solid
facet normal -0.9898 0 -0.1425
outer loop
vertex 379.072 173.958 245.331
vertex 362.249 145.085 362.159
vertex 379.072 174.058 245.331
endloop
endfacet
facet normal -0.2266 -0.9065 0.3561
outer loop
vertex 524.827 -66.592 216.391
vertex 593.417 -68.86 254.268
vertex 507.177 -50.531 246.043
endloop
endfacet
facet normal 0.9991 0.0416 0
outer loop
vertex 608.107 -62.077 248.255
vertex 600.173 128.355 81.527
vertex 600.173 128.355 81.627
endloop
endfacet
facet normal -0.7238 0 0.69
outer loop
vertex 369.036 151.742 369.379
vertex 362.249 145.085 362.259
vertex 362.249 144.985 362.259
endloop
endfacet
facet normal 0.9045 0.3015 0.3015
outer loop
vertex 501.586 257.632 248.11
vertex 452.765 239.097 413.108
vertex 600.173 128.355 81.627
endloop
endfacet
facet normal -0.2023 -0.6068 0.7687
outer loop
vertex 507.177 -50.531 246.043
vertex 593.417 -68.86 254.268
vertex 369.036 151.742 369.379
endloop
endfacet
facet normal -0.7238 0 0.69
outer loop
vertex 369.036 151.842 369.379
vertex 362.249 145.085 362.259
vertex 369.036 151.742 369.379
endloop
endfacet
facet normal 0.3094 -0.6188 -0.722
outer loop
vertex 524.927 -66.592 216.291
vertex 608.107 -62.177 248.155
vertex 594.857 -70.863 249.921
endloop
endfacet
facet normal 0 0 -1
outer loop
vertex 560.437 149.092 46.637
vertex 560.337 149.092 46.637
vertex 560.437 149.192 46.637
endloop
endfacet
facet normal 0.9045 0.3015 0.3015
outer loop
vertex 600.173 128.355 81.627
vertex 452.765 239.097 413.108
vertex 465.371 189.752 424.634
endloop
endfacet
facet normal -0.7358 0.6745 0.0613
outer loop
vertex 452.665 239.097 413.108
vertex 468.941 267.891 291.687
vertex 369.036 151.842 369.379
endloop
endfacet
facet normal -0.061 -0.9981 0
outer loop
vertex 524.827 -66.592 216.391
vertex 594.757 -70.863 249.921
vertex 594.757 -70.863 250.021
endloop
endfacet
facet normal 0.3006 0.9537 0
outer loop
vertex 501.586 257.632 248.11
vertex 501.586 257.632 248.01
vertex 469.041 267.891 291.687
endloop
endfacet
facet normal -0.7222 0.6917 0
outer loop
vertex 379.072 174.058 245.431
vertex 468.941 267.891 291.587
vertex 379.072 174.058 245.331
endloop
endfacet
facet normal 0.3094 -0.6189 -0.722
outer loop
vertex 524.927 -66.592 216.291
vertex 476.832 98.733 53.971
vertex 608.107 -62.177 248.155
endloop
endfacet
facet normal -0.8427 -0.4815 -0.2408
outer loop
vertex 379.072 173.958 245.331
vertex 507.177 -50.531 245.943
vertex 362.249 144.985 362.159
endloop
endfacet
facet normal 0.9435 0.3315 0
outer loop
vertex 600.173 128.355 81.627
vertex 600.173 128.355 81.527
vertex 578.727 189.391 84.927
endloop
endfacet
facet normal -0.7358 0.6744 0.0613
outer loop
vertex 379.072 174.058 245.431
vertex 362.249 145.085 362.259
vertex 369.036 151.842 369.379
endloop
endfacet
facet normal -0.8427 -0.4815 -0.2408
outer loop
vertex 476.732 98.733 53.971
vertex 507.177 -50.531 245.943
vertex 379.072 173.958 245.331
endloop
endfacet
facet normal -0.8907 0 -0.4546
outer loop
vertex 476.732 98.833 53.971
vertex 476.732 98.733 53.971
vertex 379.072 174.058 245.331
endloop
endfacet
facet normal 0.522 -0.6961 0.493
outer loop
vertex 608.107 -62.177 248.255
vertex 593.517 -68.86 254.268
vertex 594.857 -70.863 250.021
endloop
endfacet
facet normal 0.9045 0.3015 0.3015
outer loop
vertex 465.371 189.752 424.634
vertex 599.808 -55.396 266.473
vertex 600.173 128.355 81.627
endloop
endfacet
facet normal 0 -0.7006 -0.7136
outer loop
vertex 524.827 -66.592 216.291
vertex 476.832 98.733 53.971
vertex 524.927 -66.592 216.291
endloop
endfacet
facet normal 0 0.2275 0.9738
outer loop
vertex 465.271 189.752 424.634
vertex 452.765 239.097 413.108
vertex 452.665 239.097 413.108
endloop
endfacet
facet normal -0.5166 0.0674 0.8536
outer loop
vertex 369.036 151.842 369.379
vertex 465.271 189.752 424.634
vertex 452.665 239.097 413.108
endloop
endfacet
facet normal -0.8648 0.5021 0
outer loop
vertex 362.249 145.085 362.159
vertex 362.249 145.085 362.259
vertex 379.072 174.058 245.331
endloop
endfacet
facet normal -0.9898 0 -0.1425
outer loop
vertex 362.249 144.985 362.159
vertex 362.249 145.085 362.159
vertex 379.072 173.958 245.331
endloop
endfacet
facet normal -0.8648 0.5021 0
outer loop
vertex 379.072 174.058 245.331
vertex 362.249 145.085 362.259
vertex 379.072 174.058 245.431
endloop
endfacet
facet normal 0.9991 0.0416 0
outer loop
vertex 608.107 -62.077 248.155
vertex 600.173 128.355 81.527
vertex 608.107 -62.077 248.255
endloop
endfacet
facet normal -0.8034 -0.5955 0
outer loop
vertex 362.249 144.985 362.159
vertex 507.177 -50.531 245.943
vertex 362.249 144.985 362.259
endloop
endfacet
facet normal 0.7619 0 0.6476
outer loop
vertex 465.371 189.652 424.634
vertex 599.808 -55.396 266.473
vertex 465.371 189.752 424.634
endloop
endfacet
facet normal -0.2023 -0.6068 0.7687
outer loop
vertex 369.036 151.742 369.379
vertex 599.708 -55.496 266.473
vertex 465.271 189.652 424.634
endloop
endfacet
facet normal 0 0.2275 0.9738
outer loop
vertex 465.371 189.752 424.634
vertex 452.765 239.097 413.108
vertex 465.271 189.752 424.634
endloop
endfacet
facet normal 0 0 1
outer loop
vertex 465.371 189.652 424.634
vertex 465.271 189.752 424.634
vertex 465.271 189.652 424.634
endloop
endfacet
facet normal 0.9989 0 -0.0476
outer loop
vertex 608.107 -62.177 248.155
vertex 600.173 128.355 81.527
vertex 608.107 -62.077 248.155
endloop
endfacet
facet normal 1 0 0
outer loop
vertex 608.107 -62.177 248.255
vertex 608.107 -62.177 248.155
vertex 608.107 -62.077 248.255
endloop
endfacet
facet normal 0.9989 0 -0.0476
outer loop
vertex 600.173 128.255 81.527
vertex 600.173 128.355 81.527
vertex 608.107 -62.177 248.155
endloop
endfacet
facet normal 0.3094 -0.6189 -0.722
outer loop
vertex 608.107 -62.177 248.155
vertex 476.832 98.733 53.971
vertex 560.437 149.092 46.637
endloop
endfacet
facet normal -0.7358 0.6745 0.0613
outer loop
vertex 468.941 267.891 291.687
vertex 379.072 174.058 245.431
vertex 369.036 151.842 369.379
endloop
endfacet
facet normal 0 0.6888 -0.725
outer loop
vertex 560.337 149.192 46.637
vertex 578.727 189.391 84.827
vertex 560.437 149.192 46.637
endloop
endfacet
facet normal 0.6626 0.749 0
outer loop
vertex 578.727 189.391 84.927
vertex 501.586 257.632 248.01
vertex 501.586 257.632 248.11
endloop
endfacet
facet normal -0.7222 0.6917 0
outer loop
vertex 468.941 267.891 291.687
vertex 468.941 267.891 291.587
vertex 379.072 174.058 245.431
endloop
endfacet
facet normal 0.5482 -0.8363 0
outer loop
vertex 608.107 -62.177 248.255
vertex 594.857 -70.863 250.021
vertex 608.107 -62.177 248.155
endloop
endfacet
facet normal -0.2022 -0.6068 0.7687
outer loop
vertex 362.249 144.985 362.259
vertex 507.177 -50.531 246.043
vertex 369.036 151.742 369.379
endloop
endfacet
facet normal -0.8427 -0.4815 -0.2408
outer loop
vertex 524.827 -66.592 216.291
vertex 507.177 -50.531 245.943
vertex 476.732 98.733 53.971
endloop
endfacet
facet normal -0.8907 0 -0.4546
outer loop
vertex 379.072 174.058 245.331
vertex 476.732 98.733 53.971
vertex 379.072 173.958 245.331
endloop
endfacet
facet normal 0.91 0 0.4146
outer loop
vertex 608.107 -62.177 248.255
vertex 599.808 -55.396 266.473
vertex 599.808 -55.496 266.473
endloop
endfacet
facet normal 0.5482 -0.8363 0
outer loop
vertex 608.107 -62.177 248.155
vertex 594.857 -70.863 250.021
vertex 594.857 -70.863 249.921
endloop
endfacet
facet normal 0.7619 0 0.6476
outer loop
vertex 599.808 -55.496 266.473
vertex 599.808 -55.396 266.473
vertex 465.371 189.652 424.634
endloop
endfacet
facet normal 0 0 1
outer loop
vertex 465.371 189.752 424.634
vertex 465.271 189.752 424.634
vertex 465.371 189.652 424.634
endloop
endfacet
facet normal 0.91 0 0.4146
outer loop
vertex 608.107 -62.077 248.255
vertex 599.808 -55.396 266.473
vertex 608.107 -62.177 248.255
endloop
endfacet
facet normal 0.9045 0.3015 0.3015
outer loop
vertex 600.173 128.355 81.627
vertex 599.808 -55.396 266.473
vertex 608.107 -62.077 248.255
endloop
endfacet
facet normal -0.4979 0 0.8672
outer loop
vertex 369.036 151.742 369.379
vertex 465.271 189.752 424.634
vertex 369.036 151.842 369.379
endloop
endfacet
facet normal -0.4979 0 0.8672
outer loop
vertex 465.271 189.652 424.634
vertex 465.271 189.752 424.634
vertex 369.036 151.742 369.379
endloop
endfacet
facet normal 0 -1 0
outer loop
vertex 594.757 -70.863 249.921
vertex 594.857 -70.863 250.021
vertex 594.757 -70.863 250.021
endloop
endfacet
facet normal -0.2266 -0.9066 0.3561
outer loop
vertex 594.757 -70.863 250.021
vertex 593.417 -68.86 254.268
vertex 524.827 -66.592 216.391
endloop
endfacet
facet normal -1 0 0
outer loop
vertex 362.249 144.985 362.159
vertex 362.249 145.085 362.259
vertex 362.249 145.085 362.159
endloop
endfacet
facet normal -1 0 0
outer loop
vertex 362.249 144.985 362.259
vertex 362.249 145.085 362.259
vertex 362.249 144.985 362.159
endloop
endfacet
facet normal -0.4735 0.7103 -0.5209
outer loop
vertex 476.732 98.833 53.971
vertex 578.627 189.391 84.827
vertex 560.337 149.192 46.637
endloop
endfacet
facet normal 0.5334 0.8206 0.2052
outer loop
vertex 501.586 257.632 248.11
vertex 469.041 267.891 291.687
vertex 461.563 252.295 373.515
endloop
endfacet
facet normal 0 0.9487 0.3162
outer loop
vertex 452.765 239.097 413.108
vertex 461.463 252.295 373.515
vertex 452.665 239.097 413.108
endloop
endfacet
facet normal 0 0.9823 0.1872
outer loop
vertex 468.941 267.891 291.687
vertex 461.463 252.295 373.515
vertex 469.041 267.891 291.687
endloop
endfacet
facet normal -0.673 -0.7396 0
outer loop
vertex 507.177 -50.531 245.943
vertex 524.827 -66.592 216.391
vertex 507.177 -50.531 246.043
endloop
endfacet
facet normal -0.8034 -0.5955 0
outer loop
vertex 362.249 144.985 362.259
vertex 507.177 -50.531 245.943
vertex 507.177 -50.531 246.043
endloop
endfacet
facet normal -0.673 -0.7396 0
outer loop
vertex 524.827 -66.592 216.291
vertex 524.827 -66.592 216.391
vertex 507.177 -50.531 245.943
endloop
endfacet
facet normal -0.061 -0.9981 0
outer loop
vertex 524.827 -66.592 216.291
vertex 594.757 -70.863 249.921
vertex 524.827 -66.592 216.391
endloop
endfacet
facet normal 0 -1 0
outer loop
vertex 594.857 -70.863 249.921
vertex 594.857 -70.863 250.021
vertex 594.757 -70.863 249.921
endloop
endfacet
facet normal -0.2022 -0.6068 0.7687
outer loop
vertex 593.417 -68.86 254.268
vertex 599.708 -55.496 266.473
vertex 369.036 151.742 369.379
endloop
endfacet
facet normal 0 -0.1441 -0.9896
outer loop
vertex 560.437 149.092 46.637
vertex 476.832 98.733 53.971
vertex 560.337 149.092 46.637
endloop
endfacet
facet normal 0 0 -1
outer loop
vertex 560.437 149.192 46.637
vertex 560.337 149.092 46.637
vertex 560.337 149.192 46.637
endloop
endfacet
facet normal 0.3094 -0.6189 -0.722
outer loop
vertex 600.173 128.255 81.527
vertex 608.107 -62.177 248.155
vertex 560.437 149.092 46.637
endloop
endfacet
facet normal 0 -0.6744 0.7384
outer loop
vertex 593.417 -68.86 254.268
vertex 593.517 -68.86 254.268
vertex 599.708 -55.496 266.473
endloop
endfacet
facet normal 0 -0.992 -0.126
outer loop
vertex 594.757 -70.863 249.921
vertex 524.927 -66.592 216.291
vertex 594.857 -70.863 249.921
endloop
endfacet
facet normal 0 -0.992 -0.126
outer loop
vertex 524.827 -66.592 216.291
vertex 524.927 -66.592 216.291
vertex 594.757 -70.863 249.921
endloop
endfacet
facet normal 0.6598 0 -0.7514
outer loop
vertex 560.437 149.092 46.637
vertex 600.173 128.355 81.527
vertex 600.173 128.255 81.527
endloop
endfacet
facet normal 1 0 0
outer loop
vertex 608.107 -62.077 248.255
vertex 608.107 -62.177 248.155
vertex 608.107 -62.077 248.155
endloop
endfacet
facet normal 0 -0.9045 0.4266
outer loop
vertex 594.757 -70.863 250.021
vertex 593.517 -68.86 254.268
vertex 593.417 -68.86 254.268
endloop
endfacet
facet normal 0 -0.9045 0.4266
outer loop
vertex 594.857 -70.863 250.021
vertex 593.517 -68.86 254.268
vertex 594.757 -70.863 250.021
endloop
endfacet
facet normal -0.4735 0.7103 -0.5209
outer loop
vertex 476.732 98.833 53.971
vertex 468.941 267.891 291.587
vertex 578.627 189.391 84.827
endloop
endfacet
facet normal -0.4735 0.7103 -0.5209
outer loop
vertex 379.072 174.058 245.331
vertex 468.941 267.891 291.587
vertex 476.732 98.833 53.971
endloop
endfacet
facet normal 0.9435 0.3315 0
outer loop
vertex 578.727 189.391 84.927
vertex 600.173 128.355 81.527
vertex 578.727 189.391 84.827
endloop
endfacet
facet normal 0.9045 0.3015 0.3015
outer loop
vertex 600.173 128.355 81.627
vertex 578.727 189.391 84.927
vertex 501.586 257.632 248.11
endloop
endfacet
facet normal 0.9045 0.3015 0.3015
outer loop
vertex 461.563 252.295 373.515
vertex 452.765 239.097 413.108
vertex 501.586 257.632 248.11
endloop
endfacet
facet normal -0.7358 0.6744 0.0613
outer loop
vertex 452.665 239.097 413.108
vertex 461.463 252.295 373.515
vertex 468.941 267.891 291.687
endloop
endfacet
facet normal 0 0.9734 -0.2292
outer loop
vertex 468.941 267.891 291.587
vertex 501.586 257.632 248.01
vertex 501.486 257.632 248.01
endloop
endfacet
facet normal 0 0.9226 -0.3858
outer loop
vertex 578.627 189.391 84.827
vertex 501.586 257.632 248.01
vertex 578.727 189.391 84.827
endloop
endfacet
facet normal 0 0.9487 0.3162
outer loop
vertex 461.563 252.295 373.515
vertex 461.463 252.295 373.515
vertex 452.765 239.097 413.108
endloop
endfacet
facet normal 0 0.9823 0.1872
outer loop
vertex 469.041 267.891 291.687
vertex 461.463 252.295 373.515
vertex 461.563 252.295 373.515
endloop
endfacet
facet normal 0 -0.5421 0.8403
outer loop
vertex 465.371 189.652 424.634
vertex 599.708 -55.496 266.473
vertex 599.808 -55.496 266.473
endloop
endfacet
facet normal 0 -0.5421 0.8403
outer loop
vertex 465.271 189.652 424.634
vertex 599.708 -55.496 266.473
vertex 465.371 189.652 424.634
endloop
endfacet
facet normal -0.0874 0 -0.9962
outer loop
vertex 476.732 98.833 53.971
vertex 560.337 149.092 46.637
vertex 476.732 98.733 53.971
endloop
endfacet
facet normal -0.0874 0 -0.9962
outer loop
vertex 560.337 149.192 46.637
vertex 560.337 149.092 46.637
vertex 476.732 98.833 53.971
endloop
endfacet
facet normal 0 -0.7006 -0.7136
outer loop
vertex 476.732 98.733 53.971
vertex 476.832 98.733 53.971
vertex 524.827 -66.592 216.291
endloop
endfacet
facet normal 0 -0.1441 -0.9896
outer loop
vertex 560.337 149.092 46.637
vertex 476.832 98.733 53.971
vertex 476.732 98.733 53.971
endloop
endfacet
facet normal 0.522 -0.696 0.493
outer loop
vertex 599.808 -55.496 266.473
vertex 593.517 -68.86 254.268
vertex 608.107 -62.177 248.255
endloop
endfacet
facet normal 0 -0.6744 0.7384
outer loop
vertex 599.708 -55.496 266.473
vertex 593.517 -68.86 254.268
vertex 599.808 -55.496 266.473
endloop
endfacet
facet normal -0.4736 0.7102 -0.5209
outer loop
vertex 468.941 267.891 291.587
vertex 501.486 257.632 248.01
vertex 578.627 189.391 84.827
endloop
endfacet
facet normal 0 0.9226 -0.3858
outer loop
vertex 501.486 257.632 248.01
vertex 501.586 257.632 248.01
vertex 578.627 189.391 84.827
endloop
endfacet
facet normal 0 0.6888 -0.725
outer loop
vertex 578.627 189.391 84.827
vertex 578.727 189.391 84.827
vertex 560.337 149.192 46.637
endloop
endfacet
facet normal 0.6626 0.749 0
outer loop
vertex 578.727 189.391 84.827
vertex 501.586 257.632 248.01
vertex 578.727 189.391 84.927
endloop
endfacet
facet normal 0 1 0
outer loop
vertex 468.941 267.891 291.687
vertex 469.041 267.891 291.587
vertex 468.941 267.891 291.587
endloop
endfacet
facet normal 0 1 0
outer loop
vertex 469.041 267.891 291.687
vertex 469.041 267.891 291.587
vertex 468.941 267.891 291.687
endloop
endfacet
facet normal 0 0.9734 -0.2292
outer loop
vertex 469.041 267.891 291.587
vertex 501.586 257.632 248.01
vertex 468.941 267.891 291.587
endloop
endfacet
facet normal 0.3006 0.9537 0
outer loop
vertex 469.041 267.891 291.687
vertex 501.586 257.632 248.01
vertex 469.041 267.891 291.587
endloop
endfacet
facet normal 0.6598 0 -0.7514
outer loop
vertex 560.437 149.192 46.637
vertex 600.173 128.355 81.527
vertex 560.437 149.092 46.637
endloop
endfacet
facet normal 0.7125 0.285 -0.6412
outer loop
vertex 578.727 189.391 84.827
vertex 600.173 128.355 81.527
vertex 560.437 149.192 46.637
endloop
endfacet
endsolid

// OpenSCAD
hull(){ translate([379.072289157,173.957831325,245.331325301])cube(0.1,0.1,0.1);
translate([362.249146758,144.984641638,362.158703072])cube(0.1,0.1,0.1);
translate([476.73210893,98.7333755541,53.9708676377])cube(0.1,0.1,0.1);
translate([524.826904055,-66.5924826904,216.290801187])cube(0.1,0.1,0.1);
translate([507.17662226,-50.530726257,245.943274602])cube(0.1,0.1,0.1);
translate([594.756973212,-70.8630212648,249.921292461])cube(0.1,0.1,0.1);
translate([593.417282046,-68.8598038135,254.167860686])cube(0.1,0.1,0.1);
translate([599.707746479,-55.4964788732,266.373239437])cube(0.1,0.1,0.1);
translate([608.007360673,-62.1766561514,248.154574132])cube(0.1,0.1,0.1);
translate([560.336730173,149.091714665,46.6371289322])cube(0.1,0.1,0.1);
translate([600.072727273,128.254545455,81.5272727273])cube(0.1,0.1,0.1);
translate([578.62745098,189.291101056,84.826546003])cube(0.1,0.1,0.1);
translate([369.036429053,151.741623566,369.279289409])cube(0.1,0.1,0.1);
translate([452.664907652,238.997361478,413.007915567])cube(0.1,0.1,0.1);
translate([465.271302251,189.65233119,424.533762058])cube(0.1,0.1,0.1);
translate([468.941105284,267.791448165,291.587333602])cube(0.1,0.1,0.1);
translate([501.486146096,257.531486146,248.010075567])cube(0.1,0.1,0.1);
translate([461.463414634,252.195121951,373.414634146])cube(0.1,0.1,0.1); }
